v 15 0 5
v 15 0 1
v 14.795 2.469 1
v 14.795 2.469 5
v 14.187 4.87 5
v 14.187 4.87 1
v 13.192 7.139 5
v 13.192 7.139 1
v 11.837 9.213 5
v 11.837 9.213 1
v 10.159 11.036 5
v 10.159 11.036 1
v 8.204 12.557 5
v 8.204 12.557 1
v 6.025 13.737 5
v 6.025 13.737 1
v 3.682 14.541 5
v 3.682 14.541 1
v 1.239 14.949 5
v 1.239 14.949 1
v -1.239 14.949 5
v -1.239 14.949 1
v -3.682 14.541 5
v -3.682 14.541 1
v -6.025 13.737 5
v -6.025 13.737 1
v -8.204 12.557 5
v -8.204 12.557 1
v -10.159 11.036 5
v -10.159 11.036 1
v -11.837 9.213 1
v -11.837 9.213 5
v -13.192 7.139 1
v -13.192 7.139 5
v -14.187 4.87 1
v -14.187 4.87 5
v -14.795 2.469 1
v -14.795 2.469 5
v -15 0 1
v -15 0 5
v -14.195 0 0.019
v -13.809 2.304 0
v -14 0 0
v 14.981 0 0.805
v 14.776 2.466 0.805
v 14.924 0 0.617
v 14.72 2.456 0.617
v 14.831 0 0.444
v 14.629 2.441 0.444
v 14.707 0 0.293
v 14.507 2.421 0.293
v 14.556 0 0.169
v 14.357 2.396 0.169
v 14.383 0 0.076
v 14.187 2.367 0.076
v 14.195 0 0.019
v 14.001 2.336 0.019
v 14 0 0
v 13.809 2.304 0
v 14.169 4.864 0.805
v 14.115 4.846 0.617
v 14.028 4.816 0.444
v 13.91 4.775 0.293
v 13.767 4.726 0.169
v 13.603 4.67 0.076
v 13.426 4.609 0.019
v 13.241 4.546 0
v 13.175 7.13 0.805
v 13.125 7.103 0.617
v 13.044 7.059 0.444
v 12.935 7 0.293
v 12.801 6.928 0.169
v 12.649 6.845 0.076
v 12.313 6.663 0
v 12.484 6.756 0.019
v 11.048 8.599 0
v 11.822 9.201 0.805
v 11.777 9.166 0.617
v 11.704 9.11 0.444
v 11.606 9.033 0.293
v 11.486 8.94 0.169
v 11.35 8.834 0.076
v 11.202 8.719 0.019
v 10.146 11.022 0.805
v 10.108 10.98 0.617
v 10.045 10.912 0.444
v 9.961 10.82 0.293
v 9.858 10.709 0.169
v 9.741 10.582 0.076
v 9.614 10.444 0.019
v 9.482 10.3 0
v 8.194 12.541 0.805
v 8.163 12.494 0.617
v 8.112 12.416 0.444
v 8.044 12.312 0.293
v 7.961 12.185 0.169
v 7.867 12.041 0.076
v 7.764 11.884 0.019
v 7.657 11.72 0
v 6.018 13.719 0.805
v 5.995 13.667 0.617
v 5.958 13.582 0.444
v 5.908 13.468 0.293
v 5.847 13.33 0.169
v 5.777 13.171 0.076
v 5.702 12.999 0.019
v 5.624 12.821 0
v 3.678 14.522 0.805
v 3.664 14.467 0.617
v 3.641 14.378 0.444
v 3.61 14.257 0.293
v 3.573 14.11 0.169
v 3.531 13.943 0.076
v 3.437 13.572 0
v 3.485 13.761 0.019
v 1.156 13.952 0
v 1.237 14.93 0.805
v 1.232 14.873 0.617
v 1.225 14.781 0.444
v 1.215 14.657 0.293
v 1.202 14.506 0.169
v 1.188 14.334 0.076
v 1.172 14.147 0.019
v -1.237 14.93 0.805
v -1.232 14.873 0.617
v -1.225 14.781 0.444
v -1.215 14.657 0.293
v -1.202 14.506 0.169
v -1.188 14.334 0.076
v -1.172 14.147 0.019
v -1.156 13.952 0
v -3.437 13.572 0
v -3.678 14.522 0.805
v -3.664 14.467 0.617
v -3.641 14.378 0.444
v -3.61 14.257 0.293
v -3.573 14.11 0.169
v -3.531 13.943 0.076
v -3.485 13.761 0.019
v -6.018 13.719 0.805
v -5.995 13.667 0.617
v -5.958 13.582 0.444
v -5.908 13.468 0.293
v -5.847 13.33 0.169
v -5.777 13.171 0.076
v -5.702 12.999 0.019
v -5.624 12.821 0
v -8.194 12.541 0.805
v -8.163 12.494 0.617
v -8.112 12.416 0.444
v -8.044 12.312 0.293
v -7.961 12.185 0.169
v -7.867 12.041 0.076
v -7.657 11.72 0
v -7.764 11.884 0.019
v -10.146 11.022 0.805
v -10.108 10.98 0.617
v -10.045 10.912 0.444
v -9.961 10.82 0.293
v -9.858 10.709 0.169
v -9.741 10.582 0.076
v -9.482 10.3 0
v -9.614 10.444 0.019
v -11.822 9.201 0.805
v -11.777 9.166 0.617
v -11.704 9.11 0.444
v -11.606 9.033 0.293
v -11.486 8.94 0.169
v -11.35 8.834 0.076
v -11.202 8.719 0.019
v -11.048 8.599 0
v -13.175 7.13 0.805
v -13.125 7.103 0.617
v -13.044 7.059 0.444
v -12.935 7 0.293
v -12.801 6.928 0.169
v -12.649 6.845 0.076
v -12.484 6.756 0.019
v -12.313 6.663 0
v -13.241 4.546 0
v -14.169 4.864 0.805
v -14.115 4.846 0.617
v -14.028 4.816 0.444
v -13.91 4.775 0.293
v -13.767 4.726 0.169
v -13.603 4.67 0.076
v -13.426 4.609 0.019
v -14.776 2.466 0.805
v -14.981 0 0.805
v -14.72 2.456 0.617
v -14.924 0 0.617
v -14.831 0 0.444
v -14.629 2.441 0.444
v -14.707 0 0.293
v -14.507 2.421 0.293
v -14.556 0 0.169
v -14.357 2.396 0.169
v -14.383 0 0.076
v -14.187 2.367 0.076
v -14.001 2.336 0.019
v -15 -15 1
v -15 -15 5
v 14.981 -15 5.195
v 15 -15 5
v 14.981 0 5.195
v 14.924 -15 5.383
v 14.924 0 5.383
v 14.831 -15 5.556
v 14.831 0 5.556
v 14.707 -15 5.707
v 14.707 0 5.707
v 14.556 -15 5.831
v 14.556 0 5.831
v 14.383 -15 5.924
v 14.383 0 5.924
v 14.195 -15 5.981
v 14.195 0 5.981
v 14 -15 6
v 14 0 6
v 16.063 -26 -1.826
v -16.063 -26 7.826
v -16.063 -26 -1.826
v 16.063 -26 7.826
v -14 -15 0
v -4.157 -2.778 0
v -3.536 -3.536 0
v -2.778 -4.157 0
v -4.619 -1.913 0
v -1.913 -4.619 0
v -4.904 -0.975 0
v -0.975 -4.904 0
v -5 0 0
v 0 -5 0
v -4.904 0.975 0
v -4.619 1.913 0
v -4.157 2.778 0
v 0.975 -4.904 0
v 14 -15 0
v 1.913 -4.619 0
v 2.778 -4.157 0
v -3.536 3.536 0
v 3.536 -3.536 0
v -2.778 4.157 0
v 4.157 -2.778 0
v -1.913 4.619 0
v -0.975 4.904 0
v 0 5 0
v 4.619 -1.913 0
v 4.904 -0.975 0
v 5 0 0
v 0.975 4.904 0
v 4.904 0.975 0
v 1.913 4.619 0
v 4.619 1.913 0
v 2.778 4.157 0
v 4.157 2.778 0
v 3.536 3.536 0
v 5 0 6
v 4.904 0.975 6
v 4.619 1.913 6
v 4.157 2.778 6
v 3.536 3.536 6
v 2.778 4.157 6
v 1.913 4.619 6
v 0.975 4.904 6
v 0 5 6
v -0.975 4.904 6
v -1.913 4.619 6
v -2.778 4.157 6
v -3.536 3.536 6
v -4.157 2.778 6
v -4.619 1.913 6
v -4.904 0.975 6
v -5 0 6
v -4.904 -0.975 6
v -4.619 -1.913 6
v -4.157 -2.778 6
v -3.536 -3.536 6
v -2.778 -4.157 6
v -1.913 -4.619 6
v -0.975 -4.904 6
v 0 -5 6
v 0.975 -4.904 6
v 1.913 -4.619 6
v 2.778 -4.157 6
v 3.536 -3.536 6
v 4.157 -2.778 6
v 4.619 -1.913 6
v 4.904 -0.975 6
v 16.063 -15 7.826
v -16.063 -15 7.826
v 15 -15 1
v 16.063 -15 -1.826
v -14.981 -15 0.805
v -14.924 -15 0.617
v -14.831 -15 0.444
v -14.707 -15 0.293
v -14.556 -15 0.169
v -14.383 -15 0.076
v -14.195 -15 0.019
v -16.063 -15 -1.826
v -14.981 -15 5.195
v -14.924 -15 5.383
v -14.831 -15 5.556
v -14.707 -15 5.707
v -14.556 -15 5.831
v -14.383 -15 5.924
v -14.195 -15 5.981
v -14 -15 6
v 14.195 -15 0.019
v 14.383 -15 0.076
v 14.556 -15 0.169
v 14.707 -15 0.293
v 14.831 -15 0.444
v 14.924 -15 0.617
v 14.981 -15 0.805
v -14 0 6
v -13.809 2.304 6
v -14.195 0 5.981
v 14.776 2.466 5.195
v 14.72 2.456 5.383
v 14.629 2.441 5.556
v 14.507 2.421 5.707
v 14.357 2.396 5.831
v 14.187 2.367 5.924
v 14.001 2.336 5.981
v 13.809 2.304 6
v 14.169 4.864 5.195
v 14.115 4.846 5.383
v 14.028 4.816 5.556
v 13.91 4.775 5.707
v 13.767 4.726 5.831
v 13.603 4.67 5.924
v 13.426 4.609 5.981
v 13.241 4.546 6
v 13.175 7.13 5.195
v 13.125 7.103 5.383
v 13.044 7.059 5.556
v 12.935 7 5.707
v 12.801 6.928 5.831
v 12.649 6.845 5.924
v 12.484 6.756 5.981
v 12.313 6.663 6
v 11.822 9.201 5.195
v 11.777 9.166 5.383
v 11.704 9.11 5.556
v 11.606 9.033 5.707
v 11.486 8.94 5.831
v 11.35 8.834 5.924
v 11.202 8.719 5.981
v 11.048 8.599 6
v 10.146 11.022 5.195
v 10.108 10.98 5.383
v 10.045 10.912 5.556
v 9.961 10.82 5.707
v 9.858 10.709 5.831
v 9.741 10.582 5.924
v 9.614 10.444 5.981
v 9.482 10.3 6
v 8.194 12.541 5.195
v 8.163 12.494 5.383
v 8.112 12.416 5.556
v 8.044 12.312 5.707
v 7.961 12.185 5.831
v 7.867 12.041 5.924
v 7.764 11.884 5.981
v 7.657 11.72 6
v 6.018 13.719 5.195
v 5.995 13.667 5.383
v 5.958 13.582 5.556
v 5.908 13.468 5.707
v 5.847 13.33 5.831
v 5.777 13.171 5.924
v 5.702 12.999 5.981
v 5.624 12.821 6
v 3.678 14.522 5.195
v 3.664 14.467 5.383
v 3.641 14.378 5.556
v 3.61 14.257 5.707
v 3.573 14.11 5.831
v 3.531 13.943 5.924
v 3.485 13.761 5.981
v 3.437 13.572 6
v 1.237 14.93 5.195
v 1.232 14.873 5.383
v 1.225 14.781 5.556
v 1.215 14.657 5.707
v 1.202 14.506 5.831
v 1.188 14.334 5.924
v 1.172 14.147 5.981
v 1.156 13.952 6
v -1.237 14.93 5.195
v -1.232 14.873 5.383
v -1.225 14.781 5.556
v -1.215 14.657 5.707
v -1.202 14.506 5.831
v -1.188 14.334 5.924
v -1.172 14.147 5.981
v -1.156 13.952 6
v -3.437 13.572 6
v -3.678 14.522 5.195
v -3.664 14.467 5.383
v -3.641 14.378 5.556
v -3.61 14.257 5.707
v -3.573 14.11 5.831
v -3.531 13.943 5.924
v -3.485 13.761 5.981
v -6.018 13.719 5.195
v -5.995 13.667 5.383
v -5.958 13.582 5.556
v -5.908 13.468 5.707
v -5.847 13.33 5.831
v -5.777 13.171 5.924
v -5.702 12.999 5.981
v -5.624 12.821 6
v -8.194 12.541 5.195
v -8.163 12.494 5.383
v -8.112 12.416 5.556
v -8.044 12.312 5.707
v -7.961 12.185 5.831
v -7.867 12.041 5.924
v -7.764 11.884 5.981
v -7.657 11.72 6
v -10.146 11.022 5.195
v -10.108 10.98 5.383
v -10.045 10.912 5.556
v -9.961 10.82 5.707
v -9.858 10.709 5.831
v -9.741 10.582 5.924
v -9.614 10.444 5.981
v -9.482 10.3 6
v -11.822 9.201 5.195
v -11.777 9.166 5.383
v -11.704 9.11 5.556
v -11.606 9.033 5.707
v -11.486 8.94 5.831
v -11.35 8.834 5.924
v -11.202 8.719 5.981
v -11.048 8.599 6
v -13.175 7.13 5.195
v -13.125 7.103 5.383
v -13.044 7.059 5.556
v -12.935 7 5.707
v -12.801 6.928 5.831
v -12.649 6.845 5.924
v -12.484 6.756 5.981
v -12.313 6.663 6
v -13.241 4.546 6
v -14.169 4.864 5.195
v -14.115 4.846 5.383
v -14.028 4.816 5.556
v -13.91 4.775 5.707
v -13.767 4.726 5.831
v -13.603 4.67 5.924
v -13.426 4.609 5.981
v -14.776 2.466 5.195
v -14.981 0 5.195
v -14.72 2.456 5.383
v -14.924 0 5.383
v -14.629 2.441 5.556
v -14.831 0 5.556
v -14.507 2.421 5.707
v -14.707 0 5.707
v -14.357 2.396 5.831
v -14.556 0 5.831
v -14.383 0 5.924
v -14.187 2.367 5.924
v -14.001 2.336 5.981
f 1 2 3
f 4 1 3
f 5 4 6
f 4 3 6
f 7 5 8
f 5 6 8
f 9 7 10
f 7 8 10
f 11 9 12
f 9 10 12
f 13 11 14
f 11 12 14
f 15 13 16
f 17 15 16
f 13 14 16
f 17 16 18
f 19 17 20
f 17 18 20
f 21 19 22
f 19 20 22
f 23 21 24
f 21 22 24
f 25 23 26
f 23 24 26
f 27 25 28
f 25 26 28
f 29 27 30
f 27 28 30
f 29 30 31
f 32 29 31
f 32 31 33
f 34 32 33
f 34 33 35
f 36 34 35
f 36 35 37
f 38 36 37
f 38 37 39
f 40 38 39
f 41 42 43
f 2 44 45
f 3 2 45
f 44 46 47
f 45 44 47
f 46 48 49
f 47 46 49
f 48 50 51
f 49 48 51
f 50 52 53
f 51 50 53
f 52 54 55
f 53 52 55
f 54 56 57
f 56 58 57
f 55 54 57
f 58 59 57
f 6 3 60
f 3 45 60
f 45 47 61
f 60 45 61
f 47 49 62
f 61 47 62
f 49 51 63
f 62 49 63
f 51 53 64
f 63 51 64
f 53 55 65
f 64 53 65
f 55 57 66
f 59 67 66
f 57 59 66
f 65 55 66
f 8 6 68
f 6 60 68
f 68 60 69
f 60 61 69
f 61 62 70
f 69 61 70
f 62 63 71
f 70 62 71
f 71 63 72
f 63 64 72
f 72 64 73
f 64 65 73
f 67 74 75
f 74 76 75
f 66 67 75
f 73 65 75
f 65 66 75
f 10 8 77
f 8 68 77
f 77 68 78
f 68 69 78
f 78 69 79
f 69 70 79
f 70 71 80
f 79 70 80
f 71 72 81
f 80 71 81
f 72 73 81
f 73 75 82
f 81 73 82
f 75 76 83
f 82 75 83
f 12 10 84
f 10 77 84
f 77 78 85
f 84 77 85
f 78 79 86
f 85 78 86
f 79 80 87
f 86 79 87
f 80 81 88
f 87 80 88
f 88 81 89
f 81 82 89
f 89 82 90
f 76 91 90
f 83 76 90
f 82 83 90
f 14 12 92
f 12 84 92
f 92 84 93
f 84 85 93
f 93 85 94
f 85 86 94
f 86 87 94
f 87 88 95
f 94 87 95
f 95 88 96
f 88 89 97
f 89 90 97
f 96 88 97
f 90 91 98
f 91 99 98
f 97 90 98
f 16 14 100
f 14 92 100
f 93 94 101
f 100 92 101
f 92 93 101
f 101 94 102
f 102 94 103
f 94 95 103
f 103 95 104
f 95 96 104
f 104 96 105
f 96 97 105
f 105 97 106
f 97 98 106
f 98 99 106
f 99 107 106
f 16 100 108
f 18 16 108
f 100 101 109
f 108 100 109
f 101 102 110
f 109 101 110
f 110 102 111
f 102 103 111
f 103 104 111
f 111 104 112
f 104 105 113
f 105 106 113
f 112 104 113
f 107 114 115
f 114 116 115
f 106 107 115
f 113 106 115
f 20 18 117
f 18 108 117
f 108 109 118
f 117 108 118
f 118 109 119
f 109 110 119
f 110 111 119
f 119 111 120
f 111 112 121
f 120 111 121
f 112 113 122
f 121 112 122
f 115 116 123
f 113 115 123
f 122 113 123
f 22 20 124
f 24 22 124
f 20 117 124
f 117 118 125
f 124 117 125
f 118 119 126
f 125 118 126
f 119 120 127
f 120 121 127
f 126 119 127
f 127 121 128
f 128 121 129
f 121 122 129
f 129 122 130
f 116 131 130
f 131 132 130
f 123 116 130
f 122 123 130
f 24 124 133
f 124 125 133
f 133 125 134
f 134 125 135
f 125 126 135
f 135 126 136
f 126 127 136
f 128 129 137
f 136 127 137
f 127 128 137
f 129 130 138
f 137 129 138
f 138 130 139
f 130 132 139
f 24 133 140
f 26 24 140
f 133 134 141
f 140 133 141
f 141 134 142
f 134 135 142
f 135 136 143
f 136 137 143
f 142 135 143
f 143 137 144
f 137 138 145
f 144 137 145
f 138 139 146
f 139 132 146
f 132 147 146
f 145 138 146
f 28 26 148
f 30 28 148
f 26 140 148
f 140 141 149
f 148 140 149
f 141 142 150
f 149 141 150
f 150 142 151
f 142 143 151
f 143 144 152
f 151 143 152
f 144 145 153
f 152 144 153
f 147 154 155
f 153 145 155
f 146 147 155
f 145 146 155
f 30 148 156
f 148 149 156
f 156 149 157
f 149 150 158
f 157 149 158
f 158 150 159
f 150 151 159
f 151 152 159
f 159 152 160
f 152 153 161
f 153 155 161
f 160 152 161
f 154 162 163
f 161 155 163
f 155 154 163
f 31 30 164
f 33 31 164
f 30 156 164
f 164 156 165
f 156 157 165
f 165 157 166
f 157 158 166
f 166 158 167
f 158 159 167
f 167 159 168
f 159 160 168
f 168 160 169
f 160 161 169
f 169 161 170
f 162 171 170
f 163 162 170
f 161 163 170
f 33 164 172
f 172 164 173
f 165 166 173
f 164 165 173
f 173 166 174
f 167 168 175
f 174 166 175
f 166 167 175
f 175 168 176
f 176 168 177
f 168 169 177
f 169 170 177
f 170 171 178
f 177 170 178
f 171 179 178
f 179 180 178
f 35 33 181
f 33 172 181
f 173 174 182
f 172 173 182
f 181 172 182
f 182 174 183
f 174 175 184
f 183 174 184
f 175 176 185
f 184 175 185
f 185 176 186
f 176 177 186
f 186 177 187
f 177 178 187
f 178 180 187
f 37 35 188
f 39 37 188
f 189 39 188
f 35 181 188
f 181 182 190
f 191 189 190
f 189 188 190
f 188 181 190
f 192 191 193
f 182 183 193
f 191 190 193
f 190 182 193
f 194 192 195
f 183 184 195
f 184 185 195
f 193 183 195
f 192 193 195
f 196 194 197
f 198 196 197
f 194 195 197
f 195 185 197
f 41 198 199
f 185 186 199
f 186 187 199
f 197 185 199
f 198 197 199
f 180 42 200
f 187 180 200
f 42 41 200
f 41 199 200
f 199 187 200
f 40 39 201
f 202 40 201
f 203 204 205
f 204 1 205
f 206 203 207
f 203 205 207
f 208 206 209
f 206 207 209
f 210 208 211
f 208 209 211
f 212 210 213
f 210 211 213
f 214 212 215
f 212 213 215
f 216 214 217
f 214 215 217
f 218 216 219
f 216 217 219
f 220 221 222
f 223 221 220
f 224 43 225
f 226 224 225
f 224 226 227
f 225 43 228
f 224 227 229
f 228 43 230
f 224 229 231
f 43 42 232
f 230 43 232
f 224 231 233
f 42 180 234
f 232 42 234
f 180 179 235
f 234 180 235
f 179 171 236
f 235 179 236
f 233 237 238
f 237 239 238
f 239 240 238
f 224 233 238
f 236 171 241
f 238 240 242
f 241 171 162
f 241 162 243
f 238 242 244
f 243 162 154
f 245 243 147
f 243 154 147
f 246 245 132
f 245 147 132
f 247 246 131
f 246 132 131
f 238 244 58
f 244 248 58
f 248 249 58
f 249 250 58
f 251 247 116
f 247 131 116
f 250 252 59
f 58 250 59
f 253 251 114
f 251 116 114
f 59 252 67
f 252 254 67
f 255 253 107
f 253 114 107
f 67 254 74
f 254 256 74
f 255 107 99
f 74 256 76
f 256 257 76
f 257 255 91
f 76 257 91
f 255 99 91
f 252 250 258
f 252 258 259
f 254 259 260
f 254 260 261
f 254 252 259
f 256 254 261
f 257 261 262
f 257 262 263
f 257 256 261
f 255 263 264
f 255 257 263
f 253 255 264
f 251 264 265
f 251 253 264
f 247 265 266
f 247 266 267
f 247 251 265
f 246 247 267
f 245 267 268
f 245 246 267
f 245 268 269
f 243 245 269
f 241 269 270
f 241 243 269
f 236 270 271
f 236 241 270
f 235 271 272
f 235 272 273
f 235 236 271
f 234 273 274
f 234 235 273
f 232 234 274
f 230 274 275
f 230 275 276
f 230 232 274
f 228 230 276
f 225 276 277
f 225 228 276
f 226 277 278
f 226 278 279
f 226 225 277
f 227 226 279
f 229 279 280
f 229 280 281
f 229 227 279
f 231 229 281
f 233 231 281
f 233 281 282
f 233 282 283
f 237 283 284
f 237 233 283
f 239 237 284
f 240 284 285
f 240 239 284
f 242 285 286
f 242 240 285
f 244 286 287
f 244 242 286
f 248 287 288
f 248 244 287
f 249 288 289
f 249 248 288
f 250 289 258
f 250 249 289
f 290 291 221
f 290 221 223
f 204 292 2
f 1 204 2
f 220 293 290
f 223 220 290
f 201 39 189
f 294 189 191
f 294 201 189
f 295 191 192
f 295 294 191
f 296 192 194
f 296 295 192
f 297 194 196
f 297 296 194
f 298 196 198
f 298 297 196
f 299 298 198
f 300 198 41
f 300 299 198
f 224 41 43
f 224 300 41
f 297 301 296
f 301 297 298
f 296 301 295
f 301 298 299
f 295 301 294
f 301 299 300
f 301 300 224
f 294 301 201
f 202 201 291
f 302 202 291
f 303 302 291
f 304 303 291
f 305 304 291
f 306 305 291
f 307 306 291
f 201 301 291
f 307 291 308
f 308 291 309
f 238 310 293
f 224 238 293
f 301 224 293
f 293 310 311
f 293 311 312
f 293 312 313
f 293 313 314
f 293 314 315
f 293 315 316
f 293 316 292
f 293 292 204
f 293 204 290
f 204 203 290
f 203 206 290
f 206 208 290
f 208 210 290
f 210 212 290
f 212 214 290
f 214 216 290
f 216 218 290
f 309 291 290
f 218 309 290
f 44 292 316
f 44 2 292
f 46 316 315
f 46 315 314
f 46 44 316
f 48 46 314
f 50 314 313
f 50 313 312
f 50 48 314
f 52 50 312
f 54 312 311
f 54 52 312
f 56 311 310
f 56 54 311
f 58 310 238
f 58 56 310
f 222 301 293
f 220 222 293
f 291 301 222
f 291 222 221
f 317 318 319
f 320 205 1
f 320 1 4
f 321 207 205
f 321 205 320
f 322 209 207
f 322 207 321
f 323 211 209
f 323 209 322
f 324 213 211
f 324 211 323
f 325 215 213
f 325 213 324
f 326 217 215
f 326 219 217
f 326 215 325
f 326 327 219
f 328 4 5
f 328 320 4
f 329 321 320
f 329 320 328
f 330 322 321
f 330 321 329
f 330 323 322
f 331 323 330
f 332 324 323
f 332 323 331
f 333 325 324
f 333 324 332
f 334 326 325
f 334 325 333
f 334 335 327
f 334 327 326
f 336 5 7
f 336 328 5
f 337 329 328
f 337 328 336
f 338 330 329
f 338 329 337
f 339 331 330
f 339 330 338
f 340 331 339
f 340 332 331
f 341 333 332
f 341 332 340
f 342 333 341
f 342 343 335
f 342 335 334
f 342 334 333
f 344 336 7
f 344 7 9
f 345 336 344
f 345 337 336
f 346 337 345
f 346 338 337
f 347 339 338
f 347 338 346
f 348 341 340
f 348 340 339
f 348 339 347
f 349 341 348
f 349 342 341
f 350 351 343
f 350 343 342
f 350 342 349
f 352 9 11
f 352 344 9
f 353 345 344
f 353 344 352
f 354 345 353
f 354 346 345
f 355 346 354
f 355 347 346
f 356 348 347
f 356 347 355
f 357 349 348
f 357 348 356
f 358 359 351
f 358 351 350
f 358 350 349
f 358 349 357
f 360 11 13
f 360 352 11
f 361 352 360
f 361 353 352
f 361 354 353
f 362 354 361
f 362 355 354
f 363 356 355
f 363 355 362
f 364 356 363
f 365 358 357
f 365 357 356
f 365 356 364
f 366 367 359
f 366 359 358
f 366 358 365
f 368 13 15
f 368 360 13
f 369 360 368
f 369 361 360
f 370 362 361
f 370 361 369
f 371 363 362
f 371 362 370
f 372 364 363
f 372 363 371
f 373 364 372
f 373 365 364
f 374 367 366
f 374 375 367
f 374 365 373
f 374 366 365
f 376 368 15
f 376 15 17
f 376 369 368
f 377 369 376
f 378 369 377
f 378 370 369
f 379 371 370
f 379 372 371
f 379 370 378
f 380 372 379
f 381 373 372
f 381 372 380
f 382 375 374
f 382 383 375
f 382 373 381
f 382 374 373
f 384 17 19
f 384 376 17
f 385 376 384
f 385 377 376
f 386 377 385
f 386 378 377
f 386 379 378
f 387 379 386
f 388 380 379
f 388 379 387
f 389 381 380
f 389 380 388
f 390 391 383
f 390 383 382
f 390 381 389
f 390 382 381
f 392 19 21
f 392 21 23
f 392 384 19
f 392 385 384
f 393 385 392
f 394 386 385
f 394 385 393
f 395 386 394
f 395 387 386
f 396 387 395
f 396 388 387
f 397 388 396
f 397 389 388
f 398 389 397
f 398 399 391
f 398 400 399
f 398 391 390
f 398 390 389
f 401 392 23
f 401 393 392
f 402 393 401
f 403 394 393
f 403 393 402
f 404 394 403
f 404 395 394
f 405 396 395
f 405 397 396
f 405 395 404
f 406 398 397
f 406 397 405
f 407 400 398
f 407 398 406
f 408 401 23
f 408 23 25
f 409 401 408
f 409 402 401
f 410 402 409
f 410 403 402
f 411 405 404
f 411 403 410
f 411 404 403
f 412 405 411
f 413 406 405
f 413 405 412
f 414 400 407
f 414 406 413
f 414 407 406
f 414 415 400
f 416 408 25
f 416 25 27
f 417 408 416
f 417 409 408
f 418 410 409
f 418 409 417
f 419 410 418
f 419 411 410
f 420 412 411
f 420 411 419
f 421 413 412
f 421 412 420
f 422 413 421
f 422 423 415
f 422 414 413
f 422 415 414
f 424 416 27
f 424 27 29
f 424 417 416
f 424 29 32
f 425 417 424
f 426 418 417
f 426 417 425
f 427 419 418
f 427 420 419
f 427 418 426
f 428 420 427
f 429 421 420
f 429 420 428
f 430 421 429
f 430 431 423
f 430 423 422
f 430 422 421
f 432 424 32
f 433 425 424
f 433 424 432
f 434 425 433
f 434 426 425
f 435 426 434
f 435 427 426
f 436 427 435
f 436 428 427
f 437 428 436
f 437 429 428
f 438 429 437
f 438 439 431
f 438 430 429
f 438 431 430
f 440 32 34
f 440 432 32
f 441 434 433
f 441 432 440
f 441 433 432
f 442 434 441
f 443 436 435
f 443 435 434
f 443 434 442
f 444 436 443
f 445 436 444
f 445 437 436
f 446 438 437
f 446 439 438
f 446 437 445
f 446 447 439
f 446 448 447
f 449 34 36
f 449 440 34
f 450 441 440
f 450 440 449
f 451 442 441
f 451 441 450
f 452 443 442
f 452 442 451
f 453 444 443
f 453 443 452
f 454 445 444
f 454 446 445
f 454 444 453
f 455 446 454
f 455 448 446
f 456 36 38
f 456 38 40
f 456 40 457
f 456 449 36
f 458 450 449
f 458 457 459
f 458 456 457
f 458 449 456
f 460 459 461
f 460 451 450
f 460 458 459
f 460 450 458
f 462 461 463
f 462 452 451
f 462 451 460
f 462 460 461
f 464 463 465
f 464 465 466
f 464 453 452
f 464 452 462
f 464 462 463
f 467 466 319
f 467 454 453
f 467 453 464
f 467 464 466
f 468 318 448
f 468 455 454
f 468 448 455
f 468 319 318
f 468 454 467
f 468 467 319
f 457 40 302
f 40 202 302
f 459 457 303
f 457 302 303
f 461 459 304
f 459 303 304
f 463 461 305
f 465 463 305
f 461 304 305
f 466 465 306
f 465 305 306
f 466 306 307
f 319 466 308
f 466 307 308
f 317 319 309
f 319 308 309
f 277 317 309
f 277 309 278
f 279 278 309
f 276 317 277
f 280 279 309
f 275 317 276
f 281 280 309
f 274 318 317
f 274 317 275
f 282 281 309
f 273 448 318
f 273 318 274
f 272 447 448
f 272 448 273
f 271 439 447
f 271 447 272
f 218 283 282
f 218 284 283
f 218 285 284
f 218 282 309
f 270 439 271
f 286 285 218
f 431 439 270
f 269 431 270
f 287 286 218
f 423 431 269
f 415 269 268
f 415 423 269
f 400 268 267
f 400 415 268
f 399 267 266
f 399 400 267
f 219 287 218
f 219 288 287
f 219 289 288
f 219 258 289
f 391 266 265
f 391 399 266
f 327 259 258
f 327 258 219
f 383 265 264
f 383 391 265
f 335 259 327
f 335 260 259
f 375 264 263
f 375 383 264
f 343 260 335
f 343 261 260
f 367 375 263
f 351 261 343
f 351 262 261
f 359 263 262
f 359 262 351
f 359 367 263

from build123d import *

# Parameters (mm, degrees)
SKETCH1_R           = 5
BOSS_EXTRUDE1_DEPTH = 6
FILLET1_R           = 1
SKETCH2_W           = 32.125499546
SKETCH2_H           = 9.652373674
BOSS_EXTRUDE2_DEPTH = 11


with BuildPart() as part:
    # Sketch1 → Boss-Extrude1 (new body)
    with BuildSketch(Plane.XY):
        with BuildLine():
            Line((-15, 0), (-15, -15))
            Line((-15, -15), (15, -15))
            Line((15, -15), (15, 0))
            ThreePointArc((15, 0), (0, 15), (-15, 0))
        make_face()
        Circle(SKETCH1_R, mode=Mode.SUBTRACT)
    extrude(amount=BOSS_EXTRUDE1_DEPTH)

    # Fillet1
    fillet1_edges = [part.edges().sort_by_distance(p)[0] for p in [
        (15, -7.5, 6),
        (0, 15, 6),
        (15, -7.5, 0),
        (-15, -7.5, 0),
        (0, 15, 0),
        (-15, -7.5, 6),
    ]]
    fillet(fillet1_edges, radius=FILLET1_R)

    # Sketch2 → Boss-Extrude2 (add)
    with BuildSketch(Plane.XZ.offset(15)):
        with Locations((0, 3)):
            Rectangle(SKETCH2_W, SKETCH2_H)
    extrude(amount=BOSS_EXTRUDE2_DEPTH)


solid = part.part
